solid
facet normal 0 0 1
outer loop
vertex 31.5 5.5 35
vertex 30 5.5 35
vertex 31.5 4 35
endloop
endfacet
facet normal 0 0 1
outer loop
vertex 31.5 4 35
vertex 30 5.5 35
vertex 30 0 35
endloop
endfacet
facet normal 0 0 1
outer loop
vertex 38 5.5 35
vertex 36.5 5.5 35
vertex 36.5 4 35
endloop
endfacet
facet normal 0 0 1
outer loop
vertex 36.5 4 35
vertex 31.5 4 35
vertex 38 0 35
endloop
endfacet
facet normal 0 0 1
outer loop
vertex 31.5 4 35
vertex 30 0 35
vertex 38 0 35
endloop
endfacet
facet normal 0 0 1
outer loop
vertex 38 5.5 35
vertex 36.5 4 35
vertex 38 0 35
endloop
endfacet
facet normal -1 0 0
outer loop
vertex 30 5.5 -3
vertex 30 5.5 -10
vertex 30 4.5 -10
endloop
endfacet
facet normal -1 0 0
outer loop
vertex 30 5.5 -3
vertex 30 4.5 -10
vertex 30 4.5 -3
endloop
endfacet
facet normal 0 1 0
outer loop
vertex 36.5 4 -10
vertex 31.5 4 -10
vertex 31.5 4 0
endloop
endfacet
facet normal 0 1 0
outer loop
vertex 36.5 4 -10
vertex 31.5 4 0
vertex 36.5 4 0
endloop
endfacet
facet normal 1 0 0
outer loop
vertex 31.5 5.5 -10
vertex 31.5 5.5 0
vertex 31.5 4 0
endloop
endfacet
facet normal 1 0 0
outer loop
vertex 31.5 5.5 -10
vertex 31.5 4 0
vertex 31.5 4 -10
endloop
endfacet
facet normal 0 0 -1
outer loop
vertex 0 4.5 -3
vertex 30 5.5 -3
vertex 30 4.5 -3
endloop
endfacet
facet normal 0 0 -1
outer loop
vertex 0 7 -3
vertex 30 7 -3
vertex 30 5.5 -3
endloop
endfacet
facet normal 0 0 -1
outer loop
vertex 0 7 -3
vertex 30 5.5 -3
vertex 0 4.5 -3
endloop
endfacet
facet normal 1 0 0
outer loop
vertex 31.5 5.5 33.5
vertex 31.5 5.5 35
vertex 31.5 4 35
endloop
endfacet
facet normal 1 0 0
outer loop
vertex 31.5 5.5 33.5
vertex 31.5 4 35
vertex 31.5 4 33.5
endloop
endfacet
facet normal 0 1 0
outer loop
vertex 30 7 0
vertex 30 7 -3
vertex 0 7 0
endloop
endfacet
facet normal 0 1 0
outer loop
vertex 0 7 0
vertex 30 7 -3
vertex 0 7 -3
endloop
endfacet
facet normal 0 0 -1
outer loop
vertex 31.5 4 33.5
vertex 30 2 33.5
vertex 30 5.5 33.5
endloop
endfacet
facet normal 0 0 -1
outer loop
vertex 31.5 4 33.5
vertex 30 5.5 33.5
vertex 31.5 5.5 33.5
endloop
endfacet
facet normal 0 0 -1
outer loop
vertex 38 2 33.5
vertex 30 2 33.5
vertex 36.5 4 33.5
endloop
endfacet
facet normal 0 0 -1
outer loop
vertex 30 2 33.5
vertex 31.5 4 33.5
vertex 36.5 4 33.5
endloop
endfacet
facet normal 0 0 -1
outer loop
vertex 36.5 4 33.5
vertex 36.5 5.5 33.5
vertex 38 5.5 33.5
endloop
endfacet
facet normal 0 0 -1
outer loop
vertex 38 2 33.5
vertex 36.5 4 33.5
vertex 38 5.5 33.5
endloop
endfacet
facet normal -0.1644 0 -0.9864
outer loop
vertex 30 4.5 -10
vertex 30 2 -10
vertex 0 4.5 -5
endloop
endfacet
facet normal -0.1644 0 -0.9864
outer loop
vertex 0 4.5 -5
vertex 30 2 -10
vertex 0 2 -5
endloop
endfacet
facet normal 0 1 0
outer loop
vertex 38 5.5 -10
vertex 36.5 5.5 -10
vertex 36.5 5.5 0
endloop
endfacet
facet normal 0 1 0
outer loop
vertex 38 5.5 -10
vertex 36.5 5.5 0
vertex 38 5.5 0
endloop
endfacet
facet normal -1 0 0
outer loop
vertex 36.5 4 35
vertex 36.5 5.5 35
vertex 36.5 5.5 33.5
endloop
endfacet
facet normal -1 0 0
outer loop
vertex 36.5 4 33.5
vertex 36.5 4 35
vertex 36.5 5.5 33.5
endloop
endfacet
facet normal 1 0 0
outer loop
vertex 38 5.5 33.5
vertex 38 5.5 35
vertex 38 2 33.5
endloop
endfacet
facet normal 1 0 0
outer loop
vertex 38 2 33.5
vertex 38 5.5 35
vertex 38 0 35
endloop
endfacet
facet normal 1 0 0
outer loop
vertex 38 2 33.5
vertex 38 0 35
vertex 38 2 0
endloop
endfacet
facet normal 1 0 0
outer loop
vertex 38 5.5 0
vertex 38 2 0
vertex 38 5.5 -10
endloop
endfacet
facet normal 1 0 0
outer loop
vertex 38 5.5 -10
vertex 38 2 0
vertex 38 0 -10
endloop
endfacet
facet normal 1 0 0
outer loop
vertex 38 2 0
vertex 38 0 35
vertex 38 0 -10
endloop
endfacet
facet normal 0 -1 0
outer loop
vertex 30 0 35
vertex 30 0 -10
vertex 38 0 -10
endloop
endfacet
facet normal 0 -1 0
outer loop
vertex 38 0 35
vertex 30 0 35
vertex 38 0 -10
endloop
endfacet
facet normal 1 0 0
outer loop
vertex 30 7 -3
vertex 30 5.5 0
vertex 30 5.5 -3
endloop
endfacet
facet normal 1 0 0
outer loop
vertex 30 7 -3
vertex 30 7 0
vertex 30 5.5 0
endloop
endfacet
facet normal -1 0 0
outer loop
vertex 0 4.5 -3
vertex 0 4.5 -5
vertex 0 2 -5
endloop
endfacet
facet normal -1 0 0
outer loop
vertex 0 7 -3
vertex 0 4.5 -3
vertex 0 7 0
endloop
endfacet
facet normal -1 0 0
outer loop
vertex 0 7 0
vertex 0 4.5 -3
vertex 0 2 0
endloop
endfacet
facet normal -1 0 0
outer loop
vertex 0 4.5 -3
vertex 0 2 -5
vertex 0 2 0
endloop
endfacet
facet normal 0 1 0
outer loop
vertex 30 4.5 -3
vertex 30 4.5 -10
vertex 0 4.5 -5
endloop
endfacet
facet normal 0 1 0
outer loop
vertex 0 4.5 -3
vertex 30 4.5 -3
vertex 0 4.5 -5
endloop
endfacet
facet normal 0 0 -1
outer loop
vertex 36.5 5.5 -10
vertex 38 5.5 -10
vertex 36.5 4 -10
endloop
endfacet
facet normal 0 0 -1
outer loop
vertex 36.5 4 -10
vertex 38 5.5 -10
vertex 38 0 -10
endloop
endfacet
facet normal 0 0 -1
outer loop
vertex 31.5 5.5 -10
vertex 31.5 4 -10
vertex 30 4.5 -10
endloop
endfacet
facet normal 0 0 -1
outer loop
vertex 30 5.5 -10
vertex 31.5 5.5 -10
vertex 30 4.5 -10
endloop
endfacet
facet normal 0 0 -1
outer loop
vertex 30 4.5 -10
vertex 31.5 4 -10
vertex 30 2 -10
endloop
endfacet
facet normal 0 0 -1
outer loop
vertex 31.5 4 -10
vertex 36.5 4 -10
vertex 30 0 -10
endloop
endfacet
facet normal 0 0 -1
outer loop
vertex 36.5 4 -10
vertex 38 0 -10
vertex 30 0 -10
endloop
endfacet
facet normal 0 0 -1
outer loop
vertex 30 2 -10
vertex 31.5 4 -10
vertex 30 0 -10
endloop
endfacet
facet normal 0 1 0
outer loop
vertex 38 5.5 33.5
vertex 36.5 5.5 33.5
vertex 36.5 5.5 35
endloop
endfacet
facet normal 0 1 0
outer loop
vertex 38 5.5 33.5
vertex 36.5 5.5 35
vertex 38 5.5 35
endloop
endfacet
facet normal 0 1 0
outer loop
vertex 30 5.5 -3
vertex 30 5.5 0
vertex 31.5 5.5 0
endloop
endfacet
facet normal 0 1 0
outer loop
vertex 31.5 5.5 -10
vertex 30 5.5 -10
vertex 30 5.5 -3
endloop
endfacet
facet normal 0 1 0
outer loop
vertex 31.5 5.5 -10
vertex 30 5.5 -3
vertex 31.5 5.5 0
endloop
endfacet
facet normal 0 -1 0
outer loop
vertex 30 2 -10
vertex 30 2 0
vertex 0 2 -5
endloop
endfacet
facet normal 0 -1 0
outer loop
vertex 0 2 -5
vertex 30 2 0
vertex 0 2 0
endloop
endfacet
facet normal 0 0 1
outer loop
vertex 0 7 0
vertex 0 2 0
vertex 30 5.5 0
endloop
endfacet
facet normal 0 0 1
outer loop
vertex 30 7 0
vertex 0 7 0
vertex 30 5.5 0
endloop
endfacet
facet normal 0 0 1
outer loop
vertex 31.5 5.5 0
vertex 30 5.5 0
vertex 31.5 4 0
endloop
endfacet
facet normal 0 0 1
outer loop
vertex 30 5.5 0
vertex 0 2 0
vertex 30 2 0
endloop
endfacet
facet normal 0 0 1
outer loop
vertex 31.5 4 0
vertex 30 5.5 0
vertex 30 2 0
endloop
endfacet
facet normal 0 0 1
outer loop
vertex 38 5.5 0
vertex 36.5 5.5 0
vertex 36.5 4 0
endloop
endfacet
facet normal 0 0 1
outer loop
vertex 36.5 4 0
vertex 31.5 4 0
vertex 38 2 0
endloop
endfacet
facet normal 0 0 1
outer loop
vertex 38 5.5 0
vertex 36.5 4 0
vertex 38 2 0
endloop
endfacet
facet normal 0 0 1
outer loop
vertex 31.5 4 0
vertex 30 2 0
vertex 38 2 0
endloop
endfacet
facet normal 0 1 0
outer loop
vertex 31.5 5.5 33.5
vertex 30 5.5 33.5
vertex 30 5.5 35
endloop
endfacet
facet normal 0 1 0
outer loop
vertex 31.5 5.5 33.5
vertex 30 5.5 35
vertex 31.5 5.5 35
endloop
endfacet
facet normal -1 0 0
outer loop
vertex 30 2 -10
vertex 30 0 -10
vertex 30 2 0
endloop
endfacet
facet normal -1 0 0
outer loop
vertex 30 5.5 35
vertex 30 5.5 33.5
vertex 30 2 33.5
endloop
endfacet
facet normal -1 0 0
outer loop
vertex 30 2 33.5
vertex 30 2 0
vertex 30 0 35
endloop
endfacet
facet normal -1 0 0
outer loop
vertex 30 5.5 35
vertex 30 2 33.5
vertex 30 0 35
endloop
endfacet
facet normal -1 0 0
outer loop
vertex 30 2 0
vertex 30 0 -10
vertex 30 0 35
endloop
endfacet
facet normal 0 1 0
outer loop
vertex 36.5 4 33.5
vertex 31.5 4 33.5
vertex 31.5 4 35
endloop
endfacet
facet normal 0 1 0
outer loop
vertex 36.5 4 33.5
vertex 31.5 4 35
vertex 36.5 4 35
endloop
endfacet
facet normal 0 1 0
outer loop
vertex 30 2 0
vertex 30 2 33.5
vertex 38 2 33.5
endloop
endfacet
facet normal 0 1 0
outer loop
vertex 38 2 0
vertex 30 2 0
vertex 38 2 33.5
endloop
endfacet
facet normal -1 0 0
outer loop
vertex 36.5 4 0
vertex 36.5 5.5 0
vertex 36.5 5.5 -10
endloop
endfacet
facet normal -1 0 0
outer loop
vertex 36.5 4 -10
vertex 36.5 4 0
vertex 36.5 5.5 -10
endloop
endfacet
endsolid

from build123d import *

# Parameters (mm, degrees)
BOSS_EXTRUDE1_DEPTH = 12
SKETCH2_W           = 8
SKETCH2_H           = 33.5
CUT_EXTRUDE1_DEPTH  = 10
SKETCH3_W           = 8
SKETCH3_H           = 45
CUT_EXTRUDE2_DEPTH  = 6.5
SKETCH4_W           = 5
SKETCH4_H           = 10
CUT_EXTRUDE3_DEPTH  = 1.5
SKETCH5_W           = 5
SKETCH5_H           = 1.5
CUT_EXTRUDE4_DEPTH  = 1.5
CUT_EXTRUDE5_DEPTH  = 2
CUT_EXTRUDE7_DEPTH  = 1
CUT_EXTRUDE8_DEPTH  = 4
SKETCH10_W          = 30
SKETCH10_H          = 3
CUT_EXTRUDE9_DEPTH  = 4
CUT_EXTRUDE10_DEPTH = 2.5


with BuildPart() as part:
    # Sketch1 → Boss-Extrude1 (new body)
    with BuildSketch(Plane(origin=(0, 0, 0), x_dir=(1, 0, 0), z_dir=(0, 1, 0))):
        Polygon((0, 0), (30, 0), (30, -35), (38, -35), (38, 10), (30, 10), (0, 5), align=None)
    extrude(amount=BOSS_EXTRUDE1_DEPTH)

    # Sketch2 → Cut-Extrude1 (cut)
    with BuildSketch(Plane(origin=(0, 12, 0), x_dir=(1, 0, 0), z_dir=(0, 1, 0))):
        with Locations((34, -16.75)):
            Rectangle(SKETCH2_W, SKETCH2_H)
    extrude(amount=-CUT_EXTRUDE1_DEPTH, mode=Mode.SUBTRACT)

    # Sketch3 → Cut-Extrude2 (cut)
    with BuildSketch(Plane(origin=(0, 12, 0), x_dir=(1, 0, 0), z_dir=(0, 1, 0))):
        with Locations((34, -12.5)):
            Rectangle(SKETCH3_W, SKETCH3_H)
    extrude(amount=-CUT_EXTRUDE2_DEPTH, mode=Mode.SUBTRACT)

    # Sketch4 → Cut-Extrude3 (cut)
    with BuildSketch(Plane(origin=(0, 5.5, 0), x_dir=(1, 0, 0), z_dir=(0, 1, 0))):
        with Locations((34, 5)):
            Rectangle(SKETCH4_W, SKETCH4_H)
    extrude(amount=-CUT_EXTRUDE3_DEPTH, mode=Mode.SUBTRACT)

    # Sketch5 → Cut-Extrude4 (cut)
    with BuildSketch(Plane(origin=(0, 5.5, 0), x_dir=(1, 0, 0), z_dir=(0, 1, 0))):
        with Locations((34, -34.25)):
            Rectangle(SKETCH5_W, SKETCH5_H)
    extrude(amount=-CUT_EXTRUDE4_DEPTH, mode=Mode.SUBTRACT)

    # Sketch6 → Cut-Extrude5 (cut)
    with BuildSketch(Plane.XZ):
        Polygon((0, 0), (30, 0), (30, -10), (0, -5), align=None)
    extrude(amount=-CUT_EXTRUDE5_DEPTH, mode=Mode.SUBTRACT)

    # Sketch7 → Cut-Extrude7 (cut)
    with BuildSketch(Plane(origin=(0, 12, 0), x_dir=(1, 0, 0), z_dir=(0, 1, 0))):
        Polygon((0, 5), (30, 10), (30, 0), (0, 0), align=None)
    extrude(amount=-CUT_EXTRUDE7_DEPTH, mode=Mode.SUBTRACT)

    # Sketch9 → Cut-Extrude8 (cut)
    with BuildSketch(Plane(origin=(0, 11, 0), x_dir=(1, 0, 0), z_dir=(0, 1, 0))):
        Polygon((0, 5), (30, 10), (30, 3), (0, 3), align=None)
    extrude(amount=-CUT_EXTRUDE8_DEPTH, mode=Mode.SUBTRACT)

    # Sketch10 → Cut-Extrude9 (cut)
    with BuildSketch(Plane(origin=(0, 11, 0), x_dir=(1, 0, 0), z_dir=(0, 1, 0))):
        with Locations((15, 1.5)):
            Rectangle(SKETCH10_W, SKETCH10_H)
    extrude(amount=-CUT_EXTRUDE9_DEPTH, mode=Mode.SUBTRACT)

    # Sketch11 → Cut-Extrude10 (cut)
    with BuildSketch(Plane(origin=(0, 7, 0), x_dir=(1, 0, 0), z_dir=(0, 1, 0))):
        Polygon((0, 5), (30, 10), (30, 3), (0, 3), align=None)
    extrude(amount=-CUT_EXTRUDE10_DEPTH, mode=Mode.SUBTRACT)


solid = part.part
